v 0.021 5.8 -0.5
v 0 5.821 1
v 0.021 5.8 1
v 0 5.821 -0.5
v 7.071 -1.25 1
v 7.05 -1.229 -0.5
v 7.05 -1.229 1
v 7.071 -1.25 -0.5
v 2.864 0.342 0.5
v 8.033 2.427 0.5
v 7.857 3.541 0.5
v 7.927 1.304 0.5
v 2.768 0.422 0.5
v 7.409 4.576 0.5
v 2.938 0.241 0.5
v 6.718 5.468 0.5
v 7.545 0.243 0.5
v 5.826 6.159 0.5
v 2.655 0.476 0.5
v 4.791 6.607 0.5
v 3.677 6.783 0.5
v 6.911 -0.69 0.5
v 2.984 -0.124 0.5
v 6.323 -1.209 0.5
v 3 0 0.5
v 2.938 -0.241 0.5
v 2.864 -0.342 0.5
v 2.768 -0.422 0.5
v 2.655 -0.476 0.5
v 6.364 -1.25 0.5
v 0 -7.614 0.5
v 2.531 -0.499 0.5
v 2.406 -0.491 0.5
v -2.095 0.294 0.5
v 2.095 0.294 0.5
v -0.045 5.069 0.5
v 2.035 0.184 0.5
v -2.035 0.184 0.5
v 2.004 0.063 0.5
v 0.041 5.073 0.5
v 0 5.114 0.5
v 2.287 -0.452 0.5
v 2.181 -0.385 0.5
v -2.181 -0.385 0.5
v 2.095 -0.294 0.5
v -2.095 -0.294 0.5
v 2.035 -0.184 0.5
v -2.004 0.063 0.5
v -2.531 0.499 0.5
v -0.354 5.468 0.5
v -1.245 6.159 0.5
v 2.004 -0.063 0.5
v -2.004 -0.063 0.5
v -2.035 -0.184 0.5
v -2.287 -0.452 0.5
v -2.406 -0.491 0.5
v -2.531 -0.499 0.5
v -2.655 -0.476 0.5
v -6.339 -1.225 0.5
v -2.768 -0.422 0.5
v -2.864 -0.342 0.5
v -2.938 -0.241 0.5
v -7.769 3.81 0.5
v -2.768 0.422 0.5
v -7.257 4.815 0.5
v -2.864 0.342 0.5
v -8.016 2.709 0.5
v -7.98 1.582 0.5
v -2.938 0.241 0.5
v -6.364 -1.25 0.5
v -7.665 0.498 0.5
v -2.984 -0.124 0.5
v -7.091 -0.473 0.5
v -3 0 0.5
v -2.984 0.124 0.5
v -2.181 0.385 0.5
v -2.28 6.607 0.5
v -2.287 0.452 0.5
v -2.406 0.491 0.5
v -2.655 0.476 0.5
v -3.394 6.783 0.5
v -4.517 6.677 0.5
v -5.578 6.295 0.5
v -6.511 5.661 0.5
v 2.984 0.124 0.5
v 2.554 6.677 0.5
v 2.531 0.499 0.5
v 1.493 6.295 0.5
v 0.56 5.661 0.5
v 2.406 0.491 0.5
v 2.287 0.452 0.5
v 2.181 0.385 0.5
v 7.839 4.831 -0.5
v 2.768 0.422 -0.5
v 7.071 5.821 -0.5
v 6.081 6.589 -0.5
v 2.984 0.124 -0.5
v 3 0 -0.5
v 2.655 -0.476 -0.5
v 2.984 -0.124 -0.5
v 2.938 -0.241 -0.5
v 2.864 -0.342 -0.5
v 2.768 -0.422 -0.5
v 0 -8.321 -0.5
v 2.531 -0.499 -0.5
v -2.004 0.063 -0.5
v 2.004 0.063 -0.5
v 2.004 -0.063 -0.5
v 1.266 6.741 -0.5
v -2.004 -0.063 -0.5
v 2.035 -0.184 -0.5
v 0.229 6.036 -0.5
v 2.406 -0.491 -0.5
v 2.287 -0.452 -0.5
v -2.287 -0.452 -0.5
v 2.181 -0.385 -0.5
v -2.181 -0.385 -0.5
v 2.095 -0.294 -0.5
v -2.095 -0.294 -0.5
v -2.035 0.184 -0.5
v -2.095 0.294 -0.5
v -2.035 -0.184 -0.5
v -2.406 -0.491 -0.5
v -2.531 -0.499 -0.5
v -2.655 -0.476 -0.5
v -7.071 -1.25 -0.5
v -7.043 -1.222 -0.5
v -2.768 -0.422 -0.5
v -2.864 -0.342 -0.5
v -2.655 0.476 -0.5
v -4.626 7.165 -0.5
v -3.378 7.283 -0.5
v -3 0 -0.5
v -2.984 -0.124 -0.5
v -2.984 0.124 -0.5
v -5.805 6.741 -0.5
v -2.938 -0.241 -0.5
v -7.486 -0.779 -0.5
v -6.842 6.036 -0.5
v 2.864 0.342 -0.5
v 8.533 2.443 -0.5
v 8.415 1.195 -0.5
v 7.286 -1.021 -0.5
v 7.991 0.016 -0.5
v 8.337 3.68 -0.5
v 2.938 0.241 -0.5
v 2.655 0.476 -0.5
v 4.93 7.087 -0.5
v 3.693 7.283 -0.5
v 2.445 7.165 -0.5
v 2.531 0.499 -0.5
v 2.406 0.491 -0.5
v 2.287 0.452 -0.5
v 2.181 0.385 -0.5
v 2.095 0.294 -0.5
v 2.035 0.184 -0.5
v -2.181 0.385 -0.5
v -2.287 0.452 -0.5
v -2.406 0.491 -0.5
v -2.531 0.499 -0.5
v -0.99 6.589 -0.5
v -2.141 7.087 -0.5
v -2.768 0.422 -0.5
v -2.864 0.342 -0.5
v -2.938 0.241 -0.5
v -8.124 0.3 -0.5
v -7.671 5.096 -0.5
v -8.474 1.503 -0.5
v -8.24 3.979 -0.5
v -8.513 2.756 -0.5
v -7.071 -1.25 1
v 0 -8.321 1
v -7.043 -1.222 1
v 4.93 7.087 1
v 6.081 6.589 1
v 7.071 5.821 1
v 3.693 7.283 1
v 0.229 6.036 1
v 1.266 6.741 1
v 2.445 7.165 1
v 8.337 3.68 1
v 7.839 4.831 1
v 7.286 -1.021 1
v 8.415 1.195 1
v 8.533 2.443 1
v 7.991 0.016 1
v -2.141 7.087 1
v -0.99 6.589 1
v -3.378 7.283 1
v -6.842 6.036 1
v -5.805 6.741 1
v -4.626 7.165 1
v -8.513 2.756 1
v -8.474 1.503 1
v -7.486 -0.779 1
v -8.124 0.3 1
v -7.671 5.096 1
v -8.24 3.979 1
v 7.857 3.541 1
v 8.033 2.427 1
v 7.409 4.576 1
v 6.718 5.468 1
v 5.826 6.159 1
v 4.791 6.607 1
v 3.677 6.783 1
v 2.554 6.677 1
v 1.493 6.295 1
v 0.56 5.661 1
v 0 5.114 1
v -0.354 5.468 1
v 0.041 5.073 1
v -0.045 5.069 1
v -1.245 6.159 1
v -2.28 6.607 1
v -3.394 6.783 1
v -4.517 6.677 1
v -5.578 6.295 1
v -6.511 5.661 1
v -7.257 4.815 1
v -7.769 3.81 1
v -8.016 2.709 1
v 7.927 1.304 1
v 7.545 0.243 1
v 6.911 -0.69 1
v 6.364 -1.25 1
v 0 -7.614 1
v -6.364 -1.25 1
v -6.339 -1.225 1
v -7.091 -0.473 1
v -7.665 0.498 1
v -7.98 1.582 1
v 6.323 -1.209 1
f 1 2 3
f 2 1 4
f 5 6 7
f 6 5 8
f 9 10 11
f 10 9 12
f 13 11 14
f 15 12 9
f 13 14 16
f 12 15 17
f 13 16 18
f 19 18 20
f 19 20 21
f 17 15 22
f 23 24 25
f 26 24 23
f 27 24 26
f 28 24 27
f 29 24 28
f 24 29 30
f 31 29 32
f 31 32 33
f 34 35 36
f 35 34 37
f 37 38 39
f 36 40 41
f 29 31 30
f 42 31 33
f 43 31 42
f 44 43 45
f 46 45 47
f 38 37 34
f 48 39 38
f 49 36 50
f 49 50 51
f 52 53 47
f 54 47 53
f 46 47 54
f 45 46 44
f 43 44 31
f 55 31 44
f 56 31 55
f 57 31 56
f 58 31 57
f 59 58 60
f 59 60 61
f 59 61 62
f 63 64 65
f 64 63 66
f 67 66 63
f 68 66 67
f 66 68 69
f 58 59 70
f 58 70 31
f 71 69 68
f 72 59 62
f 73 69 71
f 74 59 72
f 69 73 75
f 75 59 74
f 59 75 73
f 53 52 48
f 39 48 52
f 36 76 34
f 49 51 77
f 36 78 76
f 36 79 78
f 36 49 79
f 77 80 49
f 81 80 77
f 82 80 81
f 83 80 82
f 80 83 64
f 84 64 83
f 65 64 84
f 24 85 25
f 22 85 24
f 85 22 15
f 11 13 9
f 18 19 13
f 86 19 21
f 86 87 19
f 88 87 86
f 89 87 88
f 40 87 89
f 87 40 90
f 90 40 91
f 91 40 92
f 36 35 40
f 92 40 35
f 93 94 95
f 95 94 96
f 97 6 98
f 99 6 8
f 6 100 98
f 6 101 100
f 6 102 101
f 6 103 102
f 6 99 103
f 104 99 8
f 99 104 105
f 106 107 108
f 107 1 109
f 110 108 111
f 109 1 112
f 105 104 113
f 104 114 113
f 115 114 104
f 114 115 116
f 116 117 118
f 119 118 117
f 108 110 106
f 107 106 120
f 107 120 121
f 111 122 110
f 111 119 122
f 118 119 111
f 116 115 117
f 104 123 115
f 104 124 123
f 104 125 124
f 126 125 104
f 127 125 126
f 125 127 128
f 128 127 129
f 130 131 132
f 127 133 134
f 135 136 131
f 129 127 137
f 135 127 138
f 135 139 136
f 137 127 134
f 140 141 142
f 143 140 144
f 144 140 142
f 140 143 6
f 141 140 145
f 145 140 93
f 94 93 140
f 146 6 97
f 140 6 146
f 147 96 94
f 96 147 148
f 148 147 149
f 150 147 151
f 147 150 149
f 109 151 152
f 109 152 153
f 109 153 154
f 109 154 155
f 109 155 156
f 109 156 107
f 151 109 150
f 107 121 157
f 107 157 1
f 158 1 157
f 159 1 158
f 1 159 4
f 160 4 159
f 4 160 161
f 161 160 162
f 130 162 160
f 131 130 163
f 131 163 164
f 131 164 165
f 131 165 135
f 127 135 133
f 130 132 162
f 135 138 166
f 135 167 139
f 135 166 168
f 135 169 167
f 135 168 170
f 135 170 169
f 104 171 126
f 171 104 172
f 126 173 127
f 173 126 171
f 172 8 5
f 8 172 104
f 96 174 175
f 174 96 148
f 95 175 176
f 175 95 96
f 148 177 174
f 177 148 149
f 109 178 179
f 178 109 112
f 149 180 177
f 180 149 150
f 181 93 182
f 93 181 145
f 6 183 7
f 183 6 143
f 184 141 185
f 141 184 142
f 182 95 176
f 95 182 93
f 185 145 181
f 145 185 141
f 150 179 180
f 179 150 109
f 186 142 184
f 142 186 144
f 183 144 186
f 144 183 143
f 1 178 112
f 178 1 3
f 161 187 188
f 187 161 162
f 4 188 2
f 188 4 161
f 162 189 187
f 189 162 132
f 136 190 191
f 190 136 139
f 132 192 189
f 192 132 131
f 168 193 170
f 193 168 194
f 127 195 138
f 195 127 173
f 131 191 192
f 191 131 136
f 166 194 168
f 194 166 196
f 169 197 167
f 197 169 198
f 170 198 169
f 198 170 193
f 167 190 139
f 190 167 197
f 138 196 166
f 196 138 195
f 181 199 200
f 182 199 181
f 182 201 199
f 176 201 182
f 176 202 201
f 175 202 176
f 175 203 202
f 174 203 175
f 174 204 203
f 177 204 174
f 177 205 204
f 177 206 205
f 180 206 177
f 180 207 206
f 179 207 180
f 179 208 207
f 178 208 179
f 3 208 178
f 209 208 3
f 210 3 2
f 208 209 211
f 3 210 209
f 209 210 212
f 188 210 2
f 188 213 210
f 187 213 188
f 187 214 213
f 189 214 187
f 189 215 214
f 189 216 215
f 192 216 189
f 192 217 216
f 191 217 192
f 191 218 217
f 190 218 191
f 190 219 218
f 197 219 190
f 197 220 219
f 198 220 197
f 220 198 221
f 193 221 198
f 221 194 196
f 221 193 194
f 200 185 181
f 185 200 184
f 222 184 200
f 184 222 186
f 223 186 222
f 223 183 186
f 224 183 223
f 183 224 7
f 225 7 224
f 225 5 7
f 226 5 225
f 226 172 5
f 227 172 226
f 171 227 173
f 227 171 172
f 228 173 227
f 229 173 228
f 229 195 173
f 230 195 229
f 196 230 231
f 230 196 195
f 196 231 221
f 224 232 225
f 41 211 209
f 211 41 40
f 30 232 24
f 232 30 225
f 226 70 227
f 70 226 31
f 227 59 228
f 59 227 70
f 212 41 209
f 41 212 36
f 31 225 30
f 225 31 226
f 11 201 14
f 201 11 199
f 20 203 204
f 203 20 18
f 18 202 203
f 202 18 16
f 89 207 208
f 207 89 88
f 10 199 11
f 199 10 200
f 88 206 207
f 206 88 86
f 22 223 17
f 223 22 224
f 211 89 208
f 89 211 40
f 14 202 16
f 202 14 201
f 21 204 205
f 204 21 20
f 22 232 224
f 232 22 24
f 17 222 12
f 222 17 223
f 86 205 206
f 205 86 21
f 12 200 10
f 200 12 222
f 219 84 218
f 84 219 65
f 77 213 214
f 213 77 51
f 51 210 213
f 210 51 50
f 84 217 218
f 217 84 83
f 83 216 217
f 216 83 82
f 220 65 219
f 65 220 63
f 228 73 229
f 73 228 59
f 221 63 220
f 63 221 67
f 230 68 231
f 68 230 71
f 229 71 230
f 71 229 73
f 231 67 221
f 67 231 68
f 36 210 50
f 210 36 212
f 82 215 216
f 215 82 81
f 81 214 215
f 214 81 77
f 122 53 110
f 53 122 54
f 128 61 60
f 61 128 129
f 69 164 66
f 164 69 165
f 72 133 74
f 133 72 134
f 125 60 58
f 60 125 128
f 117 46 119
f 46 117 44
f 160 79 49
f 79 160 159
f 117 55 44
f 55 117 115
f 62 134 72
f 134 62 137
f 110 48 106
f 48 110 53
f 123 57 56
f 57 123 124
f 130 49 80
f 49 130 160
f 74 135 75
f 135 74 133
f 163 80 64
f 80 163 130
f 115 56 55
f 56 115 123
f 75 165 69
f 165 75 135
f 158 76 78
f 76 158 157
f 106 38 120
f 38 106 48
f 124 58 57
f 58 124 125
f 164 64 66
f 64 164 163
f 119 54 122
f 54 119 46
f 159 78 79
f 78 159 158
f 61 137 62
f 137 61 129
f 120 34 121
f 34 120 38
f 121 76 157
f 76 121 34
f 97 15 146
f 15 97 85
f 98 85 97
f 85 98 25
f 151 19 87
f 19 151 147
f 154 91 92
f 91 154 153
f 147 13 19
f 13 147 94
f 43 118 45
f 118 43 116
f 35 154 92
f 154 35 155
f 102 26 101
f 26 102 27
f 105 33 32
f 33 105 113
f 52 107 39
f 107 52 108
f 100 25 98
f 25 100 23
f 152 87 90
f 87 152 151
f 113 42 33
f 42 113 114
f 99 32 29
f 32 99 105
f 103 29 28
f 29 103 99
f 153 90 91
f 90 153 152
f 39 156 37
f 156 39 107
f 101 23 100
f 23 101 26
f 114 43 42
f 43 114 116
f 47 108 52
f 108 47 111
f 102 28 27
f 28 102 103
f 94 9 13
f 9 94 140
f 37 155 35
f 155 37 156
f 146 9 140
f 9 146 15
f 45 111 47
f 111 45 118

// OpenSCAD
//+-------------------------------------------------+
//|OPENSCAD Bouton de mercercie - haberdasher Button|
//|        2015 gaziel@gmail.com                    |
//+- -----------------------------------------------+   

//your choice...   
type="love";//[round,square,flower,cat,bunny,MMice,love]

//external diameter or length of the button
bd=10;

//thinkness
bep=1;

//border ? Yes of course!
border="yes";//[yes,no]

//allowance
borderep=1;

//size  for the border 
borderd=1;

//number of holes
hn=2;//[2,4,6]

//hole diameter
hd=1;

//holes repartition diameter
hr=4;

$fn=50/2;

bouton();

module bouton(){
    difference(){
        corps();
        for (i=[1:hn]){
            rotate([0,0,(i*360)/hn])translate([(hr+hd)/2,0,0]) cylinder(d=hd,h=bep+1,center=true);
        }
    } 
}
module corps(){
   if (type=="round"){
       cylinder(d=bd,h=bep,center=true);
       if (border=="yes"){
           difference(){
               translate([0,0,bep/2])cylinder(d=bd,h=borderep,center=true);
               translate([0,0,bep/2])cylinder(d=bd-borderd,h=borderep+1,center=true);
           }
        }          
   }
  if (type=="square"){
   cube([bd,bd,bep],center=true);
   if (border=="yes"){
       difference(){
           translate([0,0,bep/2]) cube([bd,bd,borderep],center=true);
           translate([0,0,bep/2])cube([bd-borderd,bd-borderd,borderep+1],center=true);
       }
    }          
}
  if (type=="flower"){
   for (i=[1:6]){
    rotate([0,0,(i*360)/6])translate([bd/3,0,0]) cylinder(d=bd/3,h=bep,center=true);
   }
   cylinder(d=bd/1.6,h=bep,center=true);
   if (border=="yes"){
       difference(){
           union(){
                  for (i=[1:6]){
translate([0,0,bep/2])    rotate([0,0,(i*360)/6])translate([bd/3,0,0]) cylinder(d=bd/3,h=borderep,center=true);
   }
  translate([0,0,bep/2]) cylinder(d=bd/1.6,h=borderep,center=true);
           }
                      union(){
                  for (i=[1:6]){
translate([0,0,bep/2])    rotate([0,0,(i*360)/6])translate([bd/3,0,0]) cylinder(d=(bd/3)-borderd,h=borderep+1,center=true);
   }
  translate([0,0,bep/2]) cylinder(d=(bd/1.6)-borderd/2,h=borderep+1,center=true);
           }

       }
    }          
}
    if (type=="cat"){
        cylinder(d=bd,h=bep,center=true);
        difference(){
            union(){
                rotate([0,0,33])scale([0.5,1.5,1])cylinder(d=bd,h=bep,center=true);
                rotate([0,0,-33])scale([0.5,1.5,1])cylinder(d=bd,h=bep,center=true);
            }    
            translate([-bd/2,0,-bd/2])cube(bd);
            
        }
       if (border=="yes"){
           difference(){
               translate([0,0,bep/2])cylinder(d=bd,h=borderep,center=true);
               translate([0,0,bep/2])cylinder(d=bd-borderd,h=borderep+1,center=true);
           }
        }          
   }
   
       if (type=="bunny"){//bof
        cylinder(d=bd,h=bep,center=true);
        difference(){
            union(){
                translate([bd/2,-bd/2,0])rotate([0,0,33])scale([0.5,1.2,1])cylinder(d=bd,h=bep,center=true);
                translate([-bd/2,-bd/2,0])rotate([0,0,-33])scale([0.5,1.2,1])cylinder(d=bd,h=bep,center=true);
            }    
           
            
        }
       if (border=="yes"){
           difference(){
               translate([0,0,bep/2])cylinder(d=bd,h=borderep,center=true);
               translate([0,0,bep/2])cylinder(d=bd-borderd,h=borderep+1,center=true);
           }
        }          
   }
   
      if (type=="MMice"){
        cylinder(d=bd,h=bep,center=true);
        difference(){
            union(){
                translate([bd/2,-bd/2,0])rotate([0,0,33])cylinder(d=bd/1.618,h=bep,center=true);
                translate([-bd/2,-bd/2,0])rotate([0,0,-33])cylinder(d=bd/1.618,h=bep,center=true);
            }       
         }
       if (border=="yes"){
           difference(){
               translate([0,0,bep/2])cylinder(d=bd,h=borderep,center=true);
               translate([0,0,bep/2])cylinder(d=bd-borderd,h=borderep+1,center=true);
           }
        }          
   }
     if (type=="love"){
       translate([0,-bd/8,0])rotate([0,0,45]){
         cube([bd,bd,bep],center=true);
         translate([bd/2,0,0])cylinder(d=bd,h=bep,center=true);
         translate([0,bd/2,0])cylinder(d=bd,h=bep,center=true);
       }      
       if (border=="yes"){
           difference(){
               translate([0,0,bep/2]) union(){ 
                 translate([0,-bd/8,0])rotate([0,0,45]){
                 cube([bd,bd,bep],center=true);
                 translate([bd/2,0,0])cylinder(d=bd,h=bep,center=true);
                 translate([0,bd/2,0])cylinder(d=bd,h=bep,center=true);
                 }
               }
               translate([0,0,bep/2]) union(){ 
                 translate([0,-bd/8,0])rotate([0,0,45]){
                 cube([bd-borderd,bd-borderd,bep+1],center=true);
                 translate([bd/2,0,0])cylinder(d=bd-borderd,h=bep+1,center=true);
                 translate([0,bd/2,0])cylinder(d=bd-borderd,h=bep+1,center=true);
                 }
               }  
            }
       }
     }
 }
